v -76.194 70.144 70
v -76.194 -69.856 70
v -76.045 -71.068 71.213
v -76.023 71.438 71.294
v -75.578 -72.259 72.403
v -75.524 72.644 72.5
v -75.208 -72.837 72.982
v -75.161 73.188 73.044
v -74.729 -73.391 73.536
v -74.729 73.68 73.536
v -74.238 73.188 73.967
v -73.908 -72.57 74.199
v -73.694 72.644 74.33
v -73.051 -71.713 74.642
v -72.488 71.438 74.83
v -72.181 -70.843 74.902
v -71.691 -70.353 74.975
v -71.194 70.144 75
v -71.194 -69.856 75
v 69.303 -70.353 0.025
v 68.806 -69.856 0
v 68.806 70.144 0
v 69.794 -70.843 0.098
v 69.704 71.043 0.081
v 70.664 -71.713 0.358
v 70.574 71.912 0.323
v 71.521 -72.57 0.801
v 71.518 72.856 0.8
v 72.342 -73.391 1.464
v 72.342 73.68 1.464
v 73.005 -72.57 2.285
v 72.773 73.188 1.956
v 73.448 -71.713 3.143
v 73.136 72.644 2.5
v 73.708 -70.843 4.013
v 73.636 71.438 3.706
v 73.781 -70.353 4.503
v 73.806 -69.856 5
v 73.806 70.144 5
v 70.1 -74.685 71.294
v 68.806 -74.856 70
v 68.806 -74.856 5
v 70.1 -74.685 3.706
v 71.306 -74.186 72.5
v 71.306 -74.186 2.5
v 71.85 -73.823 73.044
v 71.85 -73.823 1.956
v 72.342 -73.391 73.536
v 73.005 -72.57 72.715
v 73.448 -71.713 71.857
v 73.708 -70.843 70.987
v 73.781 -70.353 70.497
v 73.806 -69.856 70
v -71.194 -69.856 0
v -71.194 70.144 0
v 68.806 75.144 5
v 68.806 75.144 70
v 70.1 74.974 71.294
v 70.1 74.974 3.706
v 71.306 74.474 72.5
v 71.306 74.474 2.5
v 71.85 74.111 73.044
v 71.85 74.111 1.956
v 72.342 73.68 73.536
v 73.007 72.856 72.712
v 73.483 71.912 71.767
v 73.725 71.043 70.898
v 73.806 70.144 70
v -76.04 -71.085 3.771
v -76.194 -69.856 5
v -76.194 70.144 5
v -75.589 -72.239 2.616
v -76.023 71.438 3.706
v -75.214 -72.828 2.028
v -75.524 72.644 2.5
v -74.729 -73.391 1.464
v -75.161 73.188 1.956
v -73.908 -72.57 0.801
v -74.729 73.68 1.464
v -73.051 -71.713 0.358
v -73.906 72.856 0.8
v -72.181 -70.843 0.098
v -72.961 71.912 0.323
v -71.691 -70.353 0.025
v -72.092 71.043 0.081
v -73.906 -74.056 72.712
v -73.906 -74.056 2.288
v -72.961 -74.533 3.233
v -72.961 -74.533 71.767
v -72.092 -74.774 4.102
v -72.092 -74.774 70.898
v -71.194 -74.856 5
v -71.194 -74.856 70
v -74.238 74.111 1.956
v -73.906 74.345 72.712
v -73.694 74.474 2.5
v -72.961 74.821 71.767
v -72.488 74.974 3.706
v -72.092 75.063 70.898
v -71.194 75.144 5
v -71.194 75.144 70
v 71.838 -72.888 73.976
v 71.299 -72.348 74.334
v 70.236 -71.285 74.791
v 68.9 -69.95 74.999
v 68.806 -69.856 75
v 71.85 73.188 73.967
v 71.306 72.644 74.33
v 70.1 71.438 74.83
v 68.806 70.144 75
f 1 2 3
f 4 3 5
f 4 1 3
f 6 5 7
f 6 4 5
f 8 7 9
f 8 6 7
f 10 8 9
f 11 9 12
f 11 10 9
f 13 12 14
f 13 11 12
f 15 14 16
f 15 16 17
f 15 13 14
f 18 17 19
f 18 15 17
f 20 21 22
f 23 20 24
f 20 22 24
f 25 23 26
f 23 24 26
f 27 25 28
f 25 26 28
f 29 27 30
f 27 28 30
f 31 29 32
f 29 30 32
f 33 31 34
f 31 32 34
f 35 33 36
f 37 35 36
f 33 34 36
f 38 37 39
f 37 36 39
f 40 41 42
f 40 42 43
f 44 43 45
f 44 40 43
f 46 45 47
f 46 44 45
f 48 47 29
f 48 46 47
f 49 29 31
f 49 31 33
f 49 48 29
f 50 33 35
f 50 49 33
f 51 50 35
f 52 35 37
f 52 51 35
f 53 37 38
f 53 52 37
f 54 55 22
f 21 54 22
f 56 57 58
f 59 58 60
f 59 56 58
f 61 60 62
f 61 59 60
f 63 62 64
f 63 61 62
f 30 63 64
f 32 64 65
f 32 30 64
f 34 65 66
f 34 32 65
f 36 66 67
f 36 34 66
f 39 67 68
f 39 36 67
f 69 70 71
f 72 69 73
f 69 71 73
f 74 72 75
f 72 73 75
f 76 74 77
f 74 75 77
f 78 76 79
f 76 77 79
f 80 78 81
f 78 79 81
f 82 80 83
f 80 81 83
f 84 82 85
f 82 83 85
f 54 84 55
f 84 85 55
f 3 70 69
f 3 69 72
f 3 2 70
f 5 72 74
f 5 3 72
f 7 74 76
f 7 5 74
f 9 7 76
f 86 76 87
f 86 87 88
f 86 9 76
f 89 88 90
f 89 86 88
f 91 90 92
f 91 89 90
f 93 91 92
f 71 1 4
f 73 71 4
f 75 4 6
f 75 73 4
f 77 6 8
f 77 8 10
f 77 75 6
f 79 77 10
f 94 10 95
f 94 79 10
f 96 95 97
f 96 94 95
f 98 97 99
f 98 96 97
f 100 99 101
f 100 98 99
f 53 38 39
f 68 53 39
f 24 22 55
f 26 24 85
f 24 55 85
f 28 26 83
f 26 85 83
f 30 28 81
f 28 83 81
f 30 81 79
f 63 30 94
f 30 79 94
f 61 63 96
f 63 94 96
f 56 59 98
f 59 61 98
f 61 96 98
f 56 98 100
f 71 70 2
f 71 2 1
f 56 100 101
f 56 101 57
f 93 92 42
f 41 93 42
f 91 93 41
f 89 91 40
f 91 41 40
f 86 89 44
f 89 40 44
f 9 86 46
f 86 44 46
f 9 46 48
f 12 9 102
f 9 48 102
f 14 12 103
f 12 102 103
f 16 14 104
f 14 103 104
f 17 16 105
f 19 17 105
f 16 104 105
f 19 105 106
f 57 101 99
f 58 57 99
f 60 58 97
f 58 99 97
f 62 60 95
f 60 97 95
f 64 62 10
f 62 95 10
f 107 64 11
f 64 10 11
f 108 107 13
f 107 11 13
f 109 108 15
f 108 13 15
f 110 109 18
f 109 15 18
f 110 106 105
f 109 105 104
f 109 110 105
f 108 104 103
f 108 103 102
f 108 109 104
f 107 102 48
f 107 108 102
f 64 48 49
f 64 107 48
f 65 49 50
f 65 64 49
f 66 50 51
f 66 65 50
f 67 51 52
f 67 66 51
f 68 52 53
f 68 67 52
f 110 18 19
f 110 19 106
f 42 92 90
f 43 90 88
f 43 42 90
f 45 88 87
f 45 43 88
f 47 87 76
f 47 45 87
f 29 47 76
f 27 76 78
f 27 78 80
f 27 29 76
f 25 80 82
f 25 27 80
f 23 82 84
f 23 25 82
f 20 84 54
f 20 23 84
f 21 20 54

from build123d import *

# Parameters (mm, degrees)
F0_W        = 150
F0_H        = 150
F1_DEPTH    = 75
F2_R        = 5
F3_T1_DEPTH = 170
F3_T3_DEPTH = 100
F4_T1_DEPTH = 170
F4_T3_DEPTH = 100
F5_T1_DEPTH = 165


# Not quite as in the source:
# - a fillet or chamfer that OpenCascade refuses, or shapes differently, is made with other operations: its cross-section is extruded or revolved along the edge and cut away or added


with BuildPart() as f1:
    # F0 (on Top) → F1 (new body)
    with BuildSketch(Plane.XY):
        with Locations((-1.1938624084, 0.1442111853)):
            Rectangle(F0_W, F0_H)
    extrude(amount=F1_DEPTH)

    # F2
    f2_edges = [f1.edges().sort_by_distance(p)[0] for p in [
        (-76.193862, -74.855789, 37.5),
        (73.806138, -74.855789, 37.5),
        (-1.193862, -74.855789, 0),
        (-1.193862, -74.855789, 75),
    ]]
    fillet(f2_edges, radius=F2_R)

    # F3: fillet of radius 5 on 4 edges, made by hand

    # F3_s2 → F3_t1 (cut)
    with BuildSketch(Plane.XZ.offset(-87.6442111853)):
        with BuildLine():
            ThreePointArc((68.8061375916, 0), (72.3416714975, 1.4644660941), (73.8061375916, 5))
            Line((73.8061375916, 5), (73.8061375916, 0))
            Line((73.8061375916, 0), (68.8061375916, 0))
        make_face()
        with BuildLine():
            ThreePointArc((68.8061375916, 75), (72.3416714975, 73.5355339059), (73.8061375916, 70))
            Line((73.8061375916, 70), (73.8061375916, 75))
            Line((73.8061375916, 75), (68.8061375916, 75))
        make_face()
    extrude(amount=F3_T1_DEPTH, mode=Mode.SUBTRACT)

    # F3_s4 → F3_t3 (cut)
    with BuildSketch(Plane.XY.offset(-12.5)):
        with BuildLine():
            ThreePointArc((68.8061375916, 75.1442111853), (72.3416714975, 73.6797450912), (73.8061375916, 70.1442111853))
            Line((73.8061375916, 70.1442111853), (73.8061375916, 75.1442111853))
            Line((73.8061375916, 75.1442111853), (68.8061375916, 75.1442111853))
        make_face()
    extrude(amount=F3_T3_DEPTH, mode=Mode.SUBTRACT)

    # F4: fillet of radius 5 on 4 edges, made by hand

    # F4_s2 → F4_t1 (cut)
    with BuildSketch(Plane.YZ.offset(-88.6938624084)):
        with BuildLine():
            ThreePointArc((70.1442111853, 0), (73.6797450912, 1.4644660941), (75.1442111853, 5))
            Line((75.1442111853, 5), (75.1442111853, 0))
            Line((75.1442111853, 0), (70.1442111853, 0))
        make_face()
        with BuildLine():
            ThreePointArc((75.1442111853, 70), (73.6797450912, 73.5355339059), (70.1442111853, 75))
            Line((70.1442111853, 75), (75.1442111853, 75))
            Line((75.1442111853, 75), (75.1442111853, 70))
        make_face()
    extrude(amount=F4_T1_DEPTH, mode=Mode.SUBTRACT)

    # F4_s4 → F4_t3 (cut)
    with BuildSketch(Plane.XY.offset(-12.5)):
        with BuildLine():
            ThreePointArc((-76.1938624084, 70.1442111853), (-74.7293963143, 73.6797450912), (-71.1938624084, 75.1442111853))
            Line((-71.1938624084, 75.1442111853), (-76.1938624084, 75.1442111853))
            Line((-76.1938624084, 75.1442111853), (-76.1938624084, 70.1442111853))
        make_face()
    extrude(amount=F4_T3_DEPTH, mode=Mode.SUBTRACT)

    # F5: fillet of radius 5 on 4 edges, made by hand

    # F5_s2 → F5_t1 (cut)
    with BuildSketch(Plane.XZ.offset(-82.6442111853)):
        with BuildLine():
            ThreePointArc((-76.1938624084, 5), (-74.7293963143, 1.4644660941), (-71.1938624084, 0))
            Line((-71.1938624084, 0), (-76.1938624084, 0))
            Line((-76.1938624084, 0), (-76.1938624084, 5))
        make_face()
        with BuildLine():
            ThreePointArc((-76.1938624084, 70), (-74.7293963143, 73.5355339059), (-71.1938624084, 75))
            Line((-71.1938624084, 75), (-76.1938624084, 75))
            Line((-76.1938624084, 75), (-76.1938624084, 70))
        make_face()
    extrude(amount=F5_T1_DEPTH, mode=Mode.SUBTRACT)


solid = f1.part
